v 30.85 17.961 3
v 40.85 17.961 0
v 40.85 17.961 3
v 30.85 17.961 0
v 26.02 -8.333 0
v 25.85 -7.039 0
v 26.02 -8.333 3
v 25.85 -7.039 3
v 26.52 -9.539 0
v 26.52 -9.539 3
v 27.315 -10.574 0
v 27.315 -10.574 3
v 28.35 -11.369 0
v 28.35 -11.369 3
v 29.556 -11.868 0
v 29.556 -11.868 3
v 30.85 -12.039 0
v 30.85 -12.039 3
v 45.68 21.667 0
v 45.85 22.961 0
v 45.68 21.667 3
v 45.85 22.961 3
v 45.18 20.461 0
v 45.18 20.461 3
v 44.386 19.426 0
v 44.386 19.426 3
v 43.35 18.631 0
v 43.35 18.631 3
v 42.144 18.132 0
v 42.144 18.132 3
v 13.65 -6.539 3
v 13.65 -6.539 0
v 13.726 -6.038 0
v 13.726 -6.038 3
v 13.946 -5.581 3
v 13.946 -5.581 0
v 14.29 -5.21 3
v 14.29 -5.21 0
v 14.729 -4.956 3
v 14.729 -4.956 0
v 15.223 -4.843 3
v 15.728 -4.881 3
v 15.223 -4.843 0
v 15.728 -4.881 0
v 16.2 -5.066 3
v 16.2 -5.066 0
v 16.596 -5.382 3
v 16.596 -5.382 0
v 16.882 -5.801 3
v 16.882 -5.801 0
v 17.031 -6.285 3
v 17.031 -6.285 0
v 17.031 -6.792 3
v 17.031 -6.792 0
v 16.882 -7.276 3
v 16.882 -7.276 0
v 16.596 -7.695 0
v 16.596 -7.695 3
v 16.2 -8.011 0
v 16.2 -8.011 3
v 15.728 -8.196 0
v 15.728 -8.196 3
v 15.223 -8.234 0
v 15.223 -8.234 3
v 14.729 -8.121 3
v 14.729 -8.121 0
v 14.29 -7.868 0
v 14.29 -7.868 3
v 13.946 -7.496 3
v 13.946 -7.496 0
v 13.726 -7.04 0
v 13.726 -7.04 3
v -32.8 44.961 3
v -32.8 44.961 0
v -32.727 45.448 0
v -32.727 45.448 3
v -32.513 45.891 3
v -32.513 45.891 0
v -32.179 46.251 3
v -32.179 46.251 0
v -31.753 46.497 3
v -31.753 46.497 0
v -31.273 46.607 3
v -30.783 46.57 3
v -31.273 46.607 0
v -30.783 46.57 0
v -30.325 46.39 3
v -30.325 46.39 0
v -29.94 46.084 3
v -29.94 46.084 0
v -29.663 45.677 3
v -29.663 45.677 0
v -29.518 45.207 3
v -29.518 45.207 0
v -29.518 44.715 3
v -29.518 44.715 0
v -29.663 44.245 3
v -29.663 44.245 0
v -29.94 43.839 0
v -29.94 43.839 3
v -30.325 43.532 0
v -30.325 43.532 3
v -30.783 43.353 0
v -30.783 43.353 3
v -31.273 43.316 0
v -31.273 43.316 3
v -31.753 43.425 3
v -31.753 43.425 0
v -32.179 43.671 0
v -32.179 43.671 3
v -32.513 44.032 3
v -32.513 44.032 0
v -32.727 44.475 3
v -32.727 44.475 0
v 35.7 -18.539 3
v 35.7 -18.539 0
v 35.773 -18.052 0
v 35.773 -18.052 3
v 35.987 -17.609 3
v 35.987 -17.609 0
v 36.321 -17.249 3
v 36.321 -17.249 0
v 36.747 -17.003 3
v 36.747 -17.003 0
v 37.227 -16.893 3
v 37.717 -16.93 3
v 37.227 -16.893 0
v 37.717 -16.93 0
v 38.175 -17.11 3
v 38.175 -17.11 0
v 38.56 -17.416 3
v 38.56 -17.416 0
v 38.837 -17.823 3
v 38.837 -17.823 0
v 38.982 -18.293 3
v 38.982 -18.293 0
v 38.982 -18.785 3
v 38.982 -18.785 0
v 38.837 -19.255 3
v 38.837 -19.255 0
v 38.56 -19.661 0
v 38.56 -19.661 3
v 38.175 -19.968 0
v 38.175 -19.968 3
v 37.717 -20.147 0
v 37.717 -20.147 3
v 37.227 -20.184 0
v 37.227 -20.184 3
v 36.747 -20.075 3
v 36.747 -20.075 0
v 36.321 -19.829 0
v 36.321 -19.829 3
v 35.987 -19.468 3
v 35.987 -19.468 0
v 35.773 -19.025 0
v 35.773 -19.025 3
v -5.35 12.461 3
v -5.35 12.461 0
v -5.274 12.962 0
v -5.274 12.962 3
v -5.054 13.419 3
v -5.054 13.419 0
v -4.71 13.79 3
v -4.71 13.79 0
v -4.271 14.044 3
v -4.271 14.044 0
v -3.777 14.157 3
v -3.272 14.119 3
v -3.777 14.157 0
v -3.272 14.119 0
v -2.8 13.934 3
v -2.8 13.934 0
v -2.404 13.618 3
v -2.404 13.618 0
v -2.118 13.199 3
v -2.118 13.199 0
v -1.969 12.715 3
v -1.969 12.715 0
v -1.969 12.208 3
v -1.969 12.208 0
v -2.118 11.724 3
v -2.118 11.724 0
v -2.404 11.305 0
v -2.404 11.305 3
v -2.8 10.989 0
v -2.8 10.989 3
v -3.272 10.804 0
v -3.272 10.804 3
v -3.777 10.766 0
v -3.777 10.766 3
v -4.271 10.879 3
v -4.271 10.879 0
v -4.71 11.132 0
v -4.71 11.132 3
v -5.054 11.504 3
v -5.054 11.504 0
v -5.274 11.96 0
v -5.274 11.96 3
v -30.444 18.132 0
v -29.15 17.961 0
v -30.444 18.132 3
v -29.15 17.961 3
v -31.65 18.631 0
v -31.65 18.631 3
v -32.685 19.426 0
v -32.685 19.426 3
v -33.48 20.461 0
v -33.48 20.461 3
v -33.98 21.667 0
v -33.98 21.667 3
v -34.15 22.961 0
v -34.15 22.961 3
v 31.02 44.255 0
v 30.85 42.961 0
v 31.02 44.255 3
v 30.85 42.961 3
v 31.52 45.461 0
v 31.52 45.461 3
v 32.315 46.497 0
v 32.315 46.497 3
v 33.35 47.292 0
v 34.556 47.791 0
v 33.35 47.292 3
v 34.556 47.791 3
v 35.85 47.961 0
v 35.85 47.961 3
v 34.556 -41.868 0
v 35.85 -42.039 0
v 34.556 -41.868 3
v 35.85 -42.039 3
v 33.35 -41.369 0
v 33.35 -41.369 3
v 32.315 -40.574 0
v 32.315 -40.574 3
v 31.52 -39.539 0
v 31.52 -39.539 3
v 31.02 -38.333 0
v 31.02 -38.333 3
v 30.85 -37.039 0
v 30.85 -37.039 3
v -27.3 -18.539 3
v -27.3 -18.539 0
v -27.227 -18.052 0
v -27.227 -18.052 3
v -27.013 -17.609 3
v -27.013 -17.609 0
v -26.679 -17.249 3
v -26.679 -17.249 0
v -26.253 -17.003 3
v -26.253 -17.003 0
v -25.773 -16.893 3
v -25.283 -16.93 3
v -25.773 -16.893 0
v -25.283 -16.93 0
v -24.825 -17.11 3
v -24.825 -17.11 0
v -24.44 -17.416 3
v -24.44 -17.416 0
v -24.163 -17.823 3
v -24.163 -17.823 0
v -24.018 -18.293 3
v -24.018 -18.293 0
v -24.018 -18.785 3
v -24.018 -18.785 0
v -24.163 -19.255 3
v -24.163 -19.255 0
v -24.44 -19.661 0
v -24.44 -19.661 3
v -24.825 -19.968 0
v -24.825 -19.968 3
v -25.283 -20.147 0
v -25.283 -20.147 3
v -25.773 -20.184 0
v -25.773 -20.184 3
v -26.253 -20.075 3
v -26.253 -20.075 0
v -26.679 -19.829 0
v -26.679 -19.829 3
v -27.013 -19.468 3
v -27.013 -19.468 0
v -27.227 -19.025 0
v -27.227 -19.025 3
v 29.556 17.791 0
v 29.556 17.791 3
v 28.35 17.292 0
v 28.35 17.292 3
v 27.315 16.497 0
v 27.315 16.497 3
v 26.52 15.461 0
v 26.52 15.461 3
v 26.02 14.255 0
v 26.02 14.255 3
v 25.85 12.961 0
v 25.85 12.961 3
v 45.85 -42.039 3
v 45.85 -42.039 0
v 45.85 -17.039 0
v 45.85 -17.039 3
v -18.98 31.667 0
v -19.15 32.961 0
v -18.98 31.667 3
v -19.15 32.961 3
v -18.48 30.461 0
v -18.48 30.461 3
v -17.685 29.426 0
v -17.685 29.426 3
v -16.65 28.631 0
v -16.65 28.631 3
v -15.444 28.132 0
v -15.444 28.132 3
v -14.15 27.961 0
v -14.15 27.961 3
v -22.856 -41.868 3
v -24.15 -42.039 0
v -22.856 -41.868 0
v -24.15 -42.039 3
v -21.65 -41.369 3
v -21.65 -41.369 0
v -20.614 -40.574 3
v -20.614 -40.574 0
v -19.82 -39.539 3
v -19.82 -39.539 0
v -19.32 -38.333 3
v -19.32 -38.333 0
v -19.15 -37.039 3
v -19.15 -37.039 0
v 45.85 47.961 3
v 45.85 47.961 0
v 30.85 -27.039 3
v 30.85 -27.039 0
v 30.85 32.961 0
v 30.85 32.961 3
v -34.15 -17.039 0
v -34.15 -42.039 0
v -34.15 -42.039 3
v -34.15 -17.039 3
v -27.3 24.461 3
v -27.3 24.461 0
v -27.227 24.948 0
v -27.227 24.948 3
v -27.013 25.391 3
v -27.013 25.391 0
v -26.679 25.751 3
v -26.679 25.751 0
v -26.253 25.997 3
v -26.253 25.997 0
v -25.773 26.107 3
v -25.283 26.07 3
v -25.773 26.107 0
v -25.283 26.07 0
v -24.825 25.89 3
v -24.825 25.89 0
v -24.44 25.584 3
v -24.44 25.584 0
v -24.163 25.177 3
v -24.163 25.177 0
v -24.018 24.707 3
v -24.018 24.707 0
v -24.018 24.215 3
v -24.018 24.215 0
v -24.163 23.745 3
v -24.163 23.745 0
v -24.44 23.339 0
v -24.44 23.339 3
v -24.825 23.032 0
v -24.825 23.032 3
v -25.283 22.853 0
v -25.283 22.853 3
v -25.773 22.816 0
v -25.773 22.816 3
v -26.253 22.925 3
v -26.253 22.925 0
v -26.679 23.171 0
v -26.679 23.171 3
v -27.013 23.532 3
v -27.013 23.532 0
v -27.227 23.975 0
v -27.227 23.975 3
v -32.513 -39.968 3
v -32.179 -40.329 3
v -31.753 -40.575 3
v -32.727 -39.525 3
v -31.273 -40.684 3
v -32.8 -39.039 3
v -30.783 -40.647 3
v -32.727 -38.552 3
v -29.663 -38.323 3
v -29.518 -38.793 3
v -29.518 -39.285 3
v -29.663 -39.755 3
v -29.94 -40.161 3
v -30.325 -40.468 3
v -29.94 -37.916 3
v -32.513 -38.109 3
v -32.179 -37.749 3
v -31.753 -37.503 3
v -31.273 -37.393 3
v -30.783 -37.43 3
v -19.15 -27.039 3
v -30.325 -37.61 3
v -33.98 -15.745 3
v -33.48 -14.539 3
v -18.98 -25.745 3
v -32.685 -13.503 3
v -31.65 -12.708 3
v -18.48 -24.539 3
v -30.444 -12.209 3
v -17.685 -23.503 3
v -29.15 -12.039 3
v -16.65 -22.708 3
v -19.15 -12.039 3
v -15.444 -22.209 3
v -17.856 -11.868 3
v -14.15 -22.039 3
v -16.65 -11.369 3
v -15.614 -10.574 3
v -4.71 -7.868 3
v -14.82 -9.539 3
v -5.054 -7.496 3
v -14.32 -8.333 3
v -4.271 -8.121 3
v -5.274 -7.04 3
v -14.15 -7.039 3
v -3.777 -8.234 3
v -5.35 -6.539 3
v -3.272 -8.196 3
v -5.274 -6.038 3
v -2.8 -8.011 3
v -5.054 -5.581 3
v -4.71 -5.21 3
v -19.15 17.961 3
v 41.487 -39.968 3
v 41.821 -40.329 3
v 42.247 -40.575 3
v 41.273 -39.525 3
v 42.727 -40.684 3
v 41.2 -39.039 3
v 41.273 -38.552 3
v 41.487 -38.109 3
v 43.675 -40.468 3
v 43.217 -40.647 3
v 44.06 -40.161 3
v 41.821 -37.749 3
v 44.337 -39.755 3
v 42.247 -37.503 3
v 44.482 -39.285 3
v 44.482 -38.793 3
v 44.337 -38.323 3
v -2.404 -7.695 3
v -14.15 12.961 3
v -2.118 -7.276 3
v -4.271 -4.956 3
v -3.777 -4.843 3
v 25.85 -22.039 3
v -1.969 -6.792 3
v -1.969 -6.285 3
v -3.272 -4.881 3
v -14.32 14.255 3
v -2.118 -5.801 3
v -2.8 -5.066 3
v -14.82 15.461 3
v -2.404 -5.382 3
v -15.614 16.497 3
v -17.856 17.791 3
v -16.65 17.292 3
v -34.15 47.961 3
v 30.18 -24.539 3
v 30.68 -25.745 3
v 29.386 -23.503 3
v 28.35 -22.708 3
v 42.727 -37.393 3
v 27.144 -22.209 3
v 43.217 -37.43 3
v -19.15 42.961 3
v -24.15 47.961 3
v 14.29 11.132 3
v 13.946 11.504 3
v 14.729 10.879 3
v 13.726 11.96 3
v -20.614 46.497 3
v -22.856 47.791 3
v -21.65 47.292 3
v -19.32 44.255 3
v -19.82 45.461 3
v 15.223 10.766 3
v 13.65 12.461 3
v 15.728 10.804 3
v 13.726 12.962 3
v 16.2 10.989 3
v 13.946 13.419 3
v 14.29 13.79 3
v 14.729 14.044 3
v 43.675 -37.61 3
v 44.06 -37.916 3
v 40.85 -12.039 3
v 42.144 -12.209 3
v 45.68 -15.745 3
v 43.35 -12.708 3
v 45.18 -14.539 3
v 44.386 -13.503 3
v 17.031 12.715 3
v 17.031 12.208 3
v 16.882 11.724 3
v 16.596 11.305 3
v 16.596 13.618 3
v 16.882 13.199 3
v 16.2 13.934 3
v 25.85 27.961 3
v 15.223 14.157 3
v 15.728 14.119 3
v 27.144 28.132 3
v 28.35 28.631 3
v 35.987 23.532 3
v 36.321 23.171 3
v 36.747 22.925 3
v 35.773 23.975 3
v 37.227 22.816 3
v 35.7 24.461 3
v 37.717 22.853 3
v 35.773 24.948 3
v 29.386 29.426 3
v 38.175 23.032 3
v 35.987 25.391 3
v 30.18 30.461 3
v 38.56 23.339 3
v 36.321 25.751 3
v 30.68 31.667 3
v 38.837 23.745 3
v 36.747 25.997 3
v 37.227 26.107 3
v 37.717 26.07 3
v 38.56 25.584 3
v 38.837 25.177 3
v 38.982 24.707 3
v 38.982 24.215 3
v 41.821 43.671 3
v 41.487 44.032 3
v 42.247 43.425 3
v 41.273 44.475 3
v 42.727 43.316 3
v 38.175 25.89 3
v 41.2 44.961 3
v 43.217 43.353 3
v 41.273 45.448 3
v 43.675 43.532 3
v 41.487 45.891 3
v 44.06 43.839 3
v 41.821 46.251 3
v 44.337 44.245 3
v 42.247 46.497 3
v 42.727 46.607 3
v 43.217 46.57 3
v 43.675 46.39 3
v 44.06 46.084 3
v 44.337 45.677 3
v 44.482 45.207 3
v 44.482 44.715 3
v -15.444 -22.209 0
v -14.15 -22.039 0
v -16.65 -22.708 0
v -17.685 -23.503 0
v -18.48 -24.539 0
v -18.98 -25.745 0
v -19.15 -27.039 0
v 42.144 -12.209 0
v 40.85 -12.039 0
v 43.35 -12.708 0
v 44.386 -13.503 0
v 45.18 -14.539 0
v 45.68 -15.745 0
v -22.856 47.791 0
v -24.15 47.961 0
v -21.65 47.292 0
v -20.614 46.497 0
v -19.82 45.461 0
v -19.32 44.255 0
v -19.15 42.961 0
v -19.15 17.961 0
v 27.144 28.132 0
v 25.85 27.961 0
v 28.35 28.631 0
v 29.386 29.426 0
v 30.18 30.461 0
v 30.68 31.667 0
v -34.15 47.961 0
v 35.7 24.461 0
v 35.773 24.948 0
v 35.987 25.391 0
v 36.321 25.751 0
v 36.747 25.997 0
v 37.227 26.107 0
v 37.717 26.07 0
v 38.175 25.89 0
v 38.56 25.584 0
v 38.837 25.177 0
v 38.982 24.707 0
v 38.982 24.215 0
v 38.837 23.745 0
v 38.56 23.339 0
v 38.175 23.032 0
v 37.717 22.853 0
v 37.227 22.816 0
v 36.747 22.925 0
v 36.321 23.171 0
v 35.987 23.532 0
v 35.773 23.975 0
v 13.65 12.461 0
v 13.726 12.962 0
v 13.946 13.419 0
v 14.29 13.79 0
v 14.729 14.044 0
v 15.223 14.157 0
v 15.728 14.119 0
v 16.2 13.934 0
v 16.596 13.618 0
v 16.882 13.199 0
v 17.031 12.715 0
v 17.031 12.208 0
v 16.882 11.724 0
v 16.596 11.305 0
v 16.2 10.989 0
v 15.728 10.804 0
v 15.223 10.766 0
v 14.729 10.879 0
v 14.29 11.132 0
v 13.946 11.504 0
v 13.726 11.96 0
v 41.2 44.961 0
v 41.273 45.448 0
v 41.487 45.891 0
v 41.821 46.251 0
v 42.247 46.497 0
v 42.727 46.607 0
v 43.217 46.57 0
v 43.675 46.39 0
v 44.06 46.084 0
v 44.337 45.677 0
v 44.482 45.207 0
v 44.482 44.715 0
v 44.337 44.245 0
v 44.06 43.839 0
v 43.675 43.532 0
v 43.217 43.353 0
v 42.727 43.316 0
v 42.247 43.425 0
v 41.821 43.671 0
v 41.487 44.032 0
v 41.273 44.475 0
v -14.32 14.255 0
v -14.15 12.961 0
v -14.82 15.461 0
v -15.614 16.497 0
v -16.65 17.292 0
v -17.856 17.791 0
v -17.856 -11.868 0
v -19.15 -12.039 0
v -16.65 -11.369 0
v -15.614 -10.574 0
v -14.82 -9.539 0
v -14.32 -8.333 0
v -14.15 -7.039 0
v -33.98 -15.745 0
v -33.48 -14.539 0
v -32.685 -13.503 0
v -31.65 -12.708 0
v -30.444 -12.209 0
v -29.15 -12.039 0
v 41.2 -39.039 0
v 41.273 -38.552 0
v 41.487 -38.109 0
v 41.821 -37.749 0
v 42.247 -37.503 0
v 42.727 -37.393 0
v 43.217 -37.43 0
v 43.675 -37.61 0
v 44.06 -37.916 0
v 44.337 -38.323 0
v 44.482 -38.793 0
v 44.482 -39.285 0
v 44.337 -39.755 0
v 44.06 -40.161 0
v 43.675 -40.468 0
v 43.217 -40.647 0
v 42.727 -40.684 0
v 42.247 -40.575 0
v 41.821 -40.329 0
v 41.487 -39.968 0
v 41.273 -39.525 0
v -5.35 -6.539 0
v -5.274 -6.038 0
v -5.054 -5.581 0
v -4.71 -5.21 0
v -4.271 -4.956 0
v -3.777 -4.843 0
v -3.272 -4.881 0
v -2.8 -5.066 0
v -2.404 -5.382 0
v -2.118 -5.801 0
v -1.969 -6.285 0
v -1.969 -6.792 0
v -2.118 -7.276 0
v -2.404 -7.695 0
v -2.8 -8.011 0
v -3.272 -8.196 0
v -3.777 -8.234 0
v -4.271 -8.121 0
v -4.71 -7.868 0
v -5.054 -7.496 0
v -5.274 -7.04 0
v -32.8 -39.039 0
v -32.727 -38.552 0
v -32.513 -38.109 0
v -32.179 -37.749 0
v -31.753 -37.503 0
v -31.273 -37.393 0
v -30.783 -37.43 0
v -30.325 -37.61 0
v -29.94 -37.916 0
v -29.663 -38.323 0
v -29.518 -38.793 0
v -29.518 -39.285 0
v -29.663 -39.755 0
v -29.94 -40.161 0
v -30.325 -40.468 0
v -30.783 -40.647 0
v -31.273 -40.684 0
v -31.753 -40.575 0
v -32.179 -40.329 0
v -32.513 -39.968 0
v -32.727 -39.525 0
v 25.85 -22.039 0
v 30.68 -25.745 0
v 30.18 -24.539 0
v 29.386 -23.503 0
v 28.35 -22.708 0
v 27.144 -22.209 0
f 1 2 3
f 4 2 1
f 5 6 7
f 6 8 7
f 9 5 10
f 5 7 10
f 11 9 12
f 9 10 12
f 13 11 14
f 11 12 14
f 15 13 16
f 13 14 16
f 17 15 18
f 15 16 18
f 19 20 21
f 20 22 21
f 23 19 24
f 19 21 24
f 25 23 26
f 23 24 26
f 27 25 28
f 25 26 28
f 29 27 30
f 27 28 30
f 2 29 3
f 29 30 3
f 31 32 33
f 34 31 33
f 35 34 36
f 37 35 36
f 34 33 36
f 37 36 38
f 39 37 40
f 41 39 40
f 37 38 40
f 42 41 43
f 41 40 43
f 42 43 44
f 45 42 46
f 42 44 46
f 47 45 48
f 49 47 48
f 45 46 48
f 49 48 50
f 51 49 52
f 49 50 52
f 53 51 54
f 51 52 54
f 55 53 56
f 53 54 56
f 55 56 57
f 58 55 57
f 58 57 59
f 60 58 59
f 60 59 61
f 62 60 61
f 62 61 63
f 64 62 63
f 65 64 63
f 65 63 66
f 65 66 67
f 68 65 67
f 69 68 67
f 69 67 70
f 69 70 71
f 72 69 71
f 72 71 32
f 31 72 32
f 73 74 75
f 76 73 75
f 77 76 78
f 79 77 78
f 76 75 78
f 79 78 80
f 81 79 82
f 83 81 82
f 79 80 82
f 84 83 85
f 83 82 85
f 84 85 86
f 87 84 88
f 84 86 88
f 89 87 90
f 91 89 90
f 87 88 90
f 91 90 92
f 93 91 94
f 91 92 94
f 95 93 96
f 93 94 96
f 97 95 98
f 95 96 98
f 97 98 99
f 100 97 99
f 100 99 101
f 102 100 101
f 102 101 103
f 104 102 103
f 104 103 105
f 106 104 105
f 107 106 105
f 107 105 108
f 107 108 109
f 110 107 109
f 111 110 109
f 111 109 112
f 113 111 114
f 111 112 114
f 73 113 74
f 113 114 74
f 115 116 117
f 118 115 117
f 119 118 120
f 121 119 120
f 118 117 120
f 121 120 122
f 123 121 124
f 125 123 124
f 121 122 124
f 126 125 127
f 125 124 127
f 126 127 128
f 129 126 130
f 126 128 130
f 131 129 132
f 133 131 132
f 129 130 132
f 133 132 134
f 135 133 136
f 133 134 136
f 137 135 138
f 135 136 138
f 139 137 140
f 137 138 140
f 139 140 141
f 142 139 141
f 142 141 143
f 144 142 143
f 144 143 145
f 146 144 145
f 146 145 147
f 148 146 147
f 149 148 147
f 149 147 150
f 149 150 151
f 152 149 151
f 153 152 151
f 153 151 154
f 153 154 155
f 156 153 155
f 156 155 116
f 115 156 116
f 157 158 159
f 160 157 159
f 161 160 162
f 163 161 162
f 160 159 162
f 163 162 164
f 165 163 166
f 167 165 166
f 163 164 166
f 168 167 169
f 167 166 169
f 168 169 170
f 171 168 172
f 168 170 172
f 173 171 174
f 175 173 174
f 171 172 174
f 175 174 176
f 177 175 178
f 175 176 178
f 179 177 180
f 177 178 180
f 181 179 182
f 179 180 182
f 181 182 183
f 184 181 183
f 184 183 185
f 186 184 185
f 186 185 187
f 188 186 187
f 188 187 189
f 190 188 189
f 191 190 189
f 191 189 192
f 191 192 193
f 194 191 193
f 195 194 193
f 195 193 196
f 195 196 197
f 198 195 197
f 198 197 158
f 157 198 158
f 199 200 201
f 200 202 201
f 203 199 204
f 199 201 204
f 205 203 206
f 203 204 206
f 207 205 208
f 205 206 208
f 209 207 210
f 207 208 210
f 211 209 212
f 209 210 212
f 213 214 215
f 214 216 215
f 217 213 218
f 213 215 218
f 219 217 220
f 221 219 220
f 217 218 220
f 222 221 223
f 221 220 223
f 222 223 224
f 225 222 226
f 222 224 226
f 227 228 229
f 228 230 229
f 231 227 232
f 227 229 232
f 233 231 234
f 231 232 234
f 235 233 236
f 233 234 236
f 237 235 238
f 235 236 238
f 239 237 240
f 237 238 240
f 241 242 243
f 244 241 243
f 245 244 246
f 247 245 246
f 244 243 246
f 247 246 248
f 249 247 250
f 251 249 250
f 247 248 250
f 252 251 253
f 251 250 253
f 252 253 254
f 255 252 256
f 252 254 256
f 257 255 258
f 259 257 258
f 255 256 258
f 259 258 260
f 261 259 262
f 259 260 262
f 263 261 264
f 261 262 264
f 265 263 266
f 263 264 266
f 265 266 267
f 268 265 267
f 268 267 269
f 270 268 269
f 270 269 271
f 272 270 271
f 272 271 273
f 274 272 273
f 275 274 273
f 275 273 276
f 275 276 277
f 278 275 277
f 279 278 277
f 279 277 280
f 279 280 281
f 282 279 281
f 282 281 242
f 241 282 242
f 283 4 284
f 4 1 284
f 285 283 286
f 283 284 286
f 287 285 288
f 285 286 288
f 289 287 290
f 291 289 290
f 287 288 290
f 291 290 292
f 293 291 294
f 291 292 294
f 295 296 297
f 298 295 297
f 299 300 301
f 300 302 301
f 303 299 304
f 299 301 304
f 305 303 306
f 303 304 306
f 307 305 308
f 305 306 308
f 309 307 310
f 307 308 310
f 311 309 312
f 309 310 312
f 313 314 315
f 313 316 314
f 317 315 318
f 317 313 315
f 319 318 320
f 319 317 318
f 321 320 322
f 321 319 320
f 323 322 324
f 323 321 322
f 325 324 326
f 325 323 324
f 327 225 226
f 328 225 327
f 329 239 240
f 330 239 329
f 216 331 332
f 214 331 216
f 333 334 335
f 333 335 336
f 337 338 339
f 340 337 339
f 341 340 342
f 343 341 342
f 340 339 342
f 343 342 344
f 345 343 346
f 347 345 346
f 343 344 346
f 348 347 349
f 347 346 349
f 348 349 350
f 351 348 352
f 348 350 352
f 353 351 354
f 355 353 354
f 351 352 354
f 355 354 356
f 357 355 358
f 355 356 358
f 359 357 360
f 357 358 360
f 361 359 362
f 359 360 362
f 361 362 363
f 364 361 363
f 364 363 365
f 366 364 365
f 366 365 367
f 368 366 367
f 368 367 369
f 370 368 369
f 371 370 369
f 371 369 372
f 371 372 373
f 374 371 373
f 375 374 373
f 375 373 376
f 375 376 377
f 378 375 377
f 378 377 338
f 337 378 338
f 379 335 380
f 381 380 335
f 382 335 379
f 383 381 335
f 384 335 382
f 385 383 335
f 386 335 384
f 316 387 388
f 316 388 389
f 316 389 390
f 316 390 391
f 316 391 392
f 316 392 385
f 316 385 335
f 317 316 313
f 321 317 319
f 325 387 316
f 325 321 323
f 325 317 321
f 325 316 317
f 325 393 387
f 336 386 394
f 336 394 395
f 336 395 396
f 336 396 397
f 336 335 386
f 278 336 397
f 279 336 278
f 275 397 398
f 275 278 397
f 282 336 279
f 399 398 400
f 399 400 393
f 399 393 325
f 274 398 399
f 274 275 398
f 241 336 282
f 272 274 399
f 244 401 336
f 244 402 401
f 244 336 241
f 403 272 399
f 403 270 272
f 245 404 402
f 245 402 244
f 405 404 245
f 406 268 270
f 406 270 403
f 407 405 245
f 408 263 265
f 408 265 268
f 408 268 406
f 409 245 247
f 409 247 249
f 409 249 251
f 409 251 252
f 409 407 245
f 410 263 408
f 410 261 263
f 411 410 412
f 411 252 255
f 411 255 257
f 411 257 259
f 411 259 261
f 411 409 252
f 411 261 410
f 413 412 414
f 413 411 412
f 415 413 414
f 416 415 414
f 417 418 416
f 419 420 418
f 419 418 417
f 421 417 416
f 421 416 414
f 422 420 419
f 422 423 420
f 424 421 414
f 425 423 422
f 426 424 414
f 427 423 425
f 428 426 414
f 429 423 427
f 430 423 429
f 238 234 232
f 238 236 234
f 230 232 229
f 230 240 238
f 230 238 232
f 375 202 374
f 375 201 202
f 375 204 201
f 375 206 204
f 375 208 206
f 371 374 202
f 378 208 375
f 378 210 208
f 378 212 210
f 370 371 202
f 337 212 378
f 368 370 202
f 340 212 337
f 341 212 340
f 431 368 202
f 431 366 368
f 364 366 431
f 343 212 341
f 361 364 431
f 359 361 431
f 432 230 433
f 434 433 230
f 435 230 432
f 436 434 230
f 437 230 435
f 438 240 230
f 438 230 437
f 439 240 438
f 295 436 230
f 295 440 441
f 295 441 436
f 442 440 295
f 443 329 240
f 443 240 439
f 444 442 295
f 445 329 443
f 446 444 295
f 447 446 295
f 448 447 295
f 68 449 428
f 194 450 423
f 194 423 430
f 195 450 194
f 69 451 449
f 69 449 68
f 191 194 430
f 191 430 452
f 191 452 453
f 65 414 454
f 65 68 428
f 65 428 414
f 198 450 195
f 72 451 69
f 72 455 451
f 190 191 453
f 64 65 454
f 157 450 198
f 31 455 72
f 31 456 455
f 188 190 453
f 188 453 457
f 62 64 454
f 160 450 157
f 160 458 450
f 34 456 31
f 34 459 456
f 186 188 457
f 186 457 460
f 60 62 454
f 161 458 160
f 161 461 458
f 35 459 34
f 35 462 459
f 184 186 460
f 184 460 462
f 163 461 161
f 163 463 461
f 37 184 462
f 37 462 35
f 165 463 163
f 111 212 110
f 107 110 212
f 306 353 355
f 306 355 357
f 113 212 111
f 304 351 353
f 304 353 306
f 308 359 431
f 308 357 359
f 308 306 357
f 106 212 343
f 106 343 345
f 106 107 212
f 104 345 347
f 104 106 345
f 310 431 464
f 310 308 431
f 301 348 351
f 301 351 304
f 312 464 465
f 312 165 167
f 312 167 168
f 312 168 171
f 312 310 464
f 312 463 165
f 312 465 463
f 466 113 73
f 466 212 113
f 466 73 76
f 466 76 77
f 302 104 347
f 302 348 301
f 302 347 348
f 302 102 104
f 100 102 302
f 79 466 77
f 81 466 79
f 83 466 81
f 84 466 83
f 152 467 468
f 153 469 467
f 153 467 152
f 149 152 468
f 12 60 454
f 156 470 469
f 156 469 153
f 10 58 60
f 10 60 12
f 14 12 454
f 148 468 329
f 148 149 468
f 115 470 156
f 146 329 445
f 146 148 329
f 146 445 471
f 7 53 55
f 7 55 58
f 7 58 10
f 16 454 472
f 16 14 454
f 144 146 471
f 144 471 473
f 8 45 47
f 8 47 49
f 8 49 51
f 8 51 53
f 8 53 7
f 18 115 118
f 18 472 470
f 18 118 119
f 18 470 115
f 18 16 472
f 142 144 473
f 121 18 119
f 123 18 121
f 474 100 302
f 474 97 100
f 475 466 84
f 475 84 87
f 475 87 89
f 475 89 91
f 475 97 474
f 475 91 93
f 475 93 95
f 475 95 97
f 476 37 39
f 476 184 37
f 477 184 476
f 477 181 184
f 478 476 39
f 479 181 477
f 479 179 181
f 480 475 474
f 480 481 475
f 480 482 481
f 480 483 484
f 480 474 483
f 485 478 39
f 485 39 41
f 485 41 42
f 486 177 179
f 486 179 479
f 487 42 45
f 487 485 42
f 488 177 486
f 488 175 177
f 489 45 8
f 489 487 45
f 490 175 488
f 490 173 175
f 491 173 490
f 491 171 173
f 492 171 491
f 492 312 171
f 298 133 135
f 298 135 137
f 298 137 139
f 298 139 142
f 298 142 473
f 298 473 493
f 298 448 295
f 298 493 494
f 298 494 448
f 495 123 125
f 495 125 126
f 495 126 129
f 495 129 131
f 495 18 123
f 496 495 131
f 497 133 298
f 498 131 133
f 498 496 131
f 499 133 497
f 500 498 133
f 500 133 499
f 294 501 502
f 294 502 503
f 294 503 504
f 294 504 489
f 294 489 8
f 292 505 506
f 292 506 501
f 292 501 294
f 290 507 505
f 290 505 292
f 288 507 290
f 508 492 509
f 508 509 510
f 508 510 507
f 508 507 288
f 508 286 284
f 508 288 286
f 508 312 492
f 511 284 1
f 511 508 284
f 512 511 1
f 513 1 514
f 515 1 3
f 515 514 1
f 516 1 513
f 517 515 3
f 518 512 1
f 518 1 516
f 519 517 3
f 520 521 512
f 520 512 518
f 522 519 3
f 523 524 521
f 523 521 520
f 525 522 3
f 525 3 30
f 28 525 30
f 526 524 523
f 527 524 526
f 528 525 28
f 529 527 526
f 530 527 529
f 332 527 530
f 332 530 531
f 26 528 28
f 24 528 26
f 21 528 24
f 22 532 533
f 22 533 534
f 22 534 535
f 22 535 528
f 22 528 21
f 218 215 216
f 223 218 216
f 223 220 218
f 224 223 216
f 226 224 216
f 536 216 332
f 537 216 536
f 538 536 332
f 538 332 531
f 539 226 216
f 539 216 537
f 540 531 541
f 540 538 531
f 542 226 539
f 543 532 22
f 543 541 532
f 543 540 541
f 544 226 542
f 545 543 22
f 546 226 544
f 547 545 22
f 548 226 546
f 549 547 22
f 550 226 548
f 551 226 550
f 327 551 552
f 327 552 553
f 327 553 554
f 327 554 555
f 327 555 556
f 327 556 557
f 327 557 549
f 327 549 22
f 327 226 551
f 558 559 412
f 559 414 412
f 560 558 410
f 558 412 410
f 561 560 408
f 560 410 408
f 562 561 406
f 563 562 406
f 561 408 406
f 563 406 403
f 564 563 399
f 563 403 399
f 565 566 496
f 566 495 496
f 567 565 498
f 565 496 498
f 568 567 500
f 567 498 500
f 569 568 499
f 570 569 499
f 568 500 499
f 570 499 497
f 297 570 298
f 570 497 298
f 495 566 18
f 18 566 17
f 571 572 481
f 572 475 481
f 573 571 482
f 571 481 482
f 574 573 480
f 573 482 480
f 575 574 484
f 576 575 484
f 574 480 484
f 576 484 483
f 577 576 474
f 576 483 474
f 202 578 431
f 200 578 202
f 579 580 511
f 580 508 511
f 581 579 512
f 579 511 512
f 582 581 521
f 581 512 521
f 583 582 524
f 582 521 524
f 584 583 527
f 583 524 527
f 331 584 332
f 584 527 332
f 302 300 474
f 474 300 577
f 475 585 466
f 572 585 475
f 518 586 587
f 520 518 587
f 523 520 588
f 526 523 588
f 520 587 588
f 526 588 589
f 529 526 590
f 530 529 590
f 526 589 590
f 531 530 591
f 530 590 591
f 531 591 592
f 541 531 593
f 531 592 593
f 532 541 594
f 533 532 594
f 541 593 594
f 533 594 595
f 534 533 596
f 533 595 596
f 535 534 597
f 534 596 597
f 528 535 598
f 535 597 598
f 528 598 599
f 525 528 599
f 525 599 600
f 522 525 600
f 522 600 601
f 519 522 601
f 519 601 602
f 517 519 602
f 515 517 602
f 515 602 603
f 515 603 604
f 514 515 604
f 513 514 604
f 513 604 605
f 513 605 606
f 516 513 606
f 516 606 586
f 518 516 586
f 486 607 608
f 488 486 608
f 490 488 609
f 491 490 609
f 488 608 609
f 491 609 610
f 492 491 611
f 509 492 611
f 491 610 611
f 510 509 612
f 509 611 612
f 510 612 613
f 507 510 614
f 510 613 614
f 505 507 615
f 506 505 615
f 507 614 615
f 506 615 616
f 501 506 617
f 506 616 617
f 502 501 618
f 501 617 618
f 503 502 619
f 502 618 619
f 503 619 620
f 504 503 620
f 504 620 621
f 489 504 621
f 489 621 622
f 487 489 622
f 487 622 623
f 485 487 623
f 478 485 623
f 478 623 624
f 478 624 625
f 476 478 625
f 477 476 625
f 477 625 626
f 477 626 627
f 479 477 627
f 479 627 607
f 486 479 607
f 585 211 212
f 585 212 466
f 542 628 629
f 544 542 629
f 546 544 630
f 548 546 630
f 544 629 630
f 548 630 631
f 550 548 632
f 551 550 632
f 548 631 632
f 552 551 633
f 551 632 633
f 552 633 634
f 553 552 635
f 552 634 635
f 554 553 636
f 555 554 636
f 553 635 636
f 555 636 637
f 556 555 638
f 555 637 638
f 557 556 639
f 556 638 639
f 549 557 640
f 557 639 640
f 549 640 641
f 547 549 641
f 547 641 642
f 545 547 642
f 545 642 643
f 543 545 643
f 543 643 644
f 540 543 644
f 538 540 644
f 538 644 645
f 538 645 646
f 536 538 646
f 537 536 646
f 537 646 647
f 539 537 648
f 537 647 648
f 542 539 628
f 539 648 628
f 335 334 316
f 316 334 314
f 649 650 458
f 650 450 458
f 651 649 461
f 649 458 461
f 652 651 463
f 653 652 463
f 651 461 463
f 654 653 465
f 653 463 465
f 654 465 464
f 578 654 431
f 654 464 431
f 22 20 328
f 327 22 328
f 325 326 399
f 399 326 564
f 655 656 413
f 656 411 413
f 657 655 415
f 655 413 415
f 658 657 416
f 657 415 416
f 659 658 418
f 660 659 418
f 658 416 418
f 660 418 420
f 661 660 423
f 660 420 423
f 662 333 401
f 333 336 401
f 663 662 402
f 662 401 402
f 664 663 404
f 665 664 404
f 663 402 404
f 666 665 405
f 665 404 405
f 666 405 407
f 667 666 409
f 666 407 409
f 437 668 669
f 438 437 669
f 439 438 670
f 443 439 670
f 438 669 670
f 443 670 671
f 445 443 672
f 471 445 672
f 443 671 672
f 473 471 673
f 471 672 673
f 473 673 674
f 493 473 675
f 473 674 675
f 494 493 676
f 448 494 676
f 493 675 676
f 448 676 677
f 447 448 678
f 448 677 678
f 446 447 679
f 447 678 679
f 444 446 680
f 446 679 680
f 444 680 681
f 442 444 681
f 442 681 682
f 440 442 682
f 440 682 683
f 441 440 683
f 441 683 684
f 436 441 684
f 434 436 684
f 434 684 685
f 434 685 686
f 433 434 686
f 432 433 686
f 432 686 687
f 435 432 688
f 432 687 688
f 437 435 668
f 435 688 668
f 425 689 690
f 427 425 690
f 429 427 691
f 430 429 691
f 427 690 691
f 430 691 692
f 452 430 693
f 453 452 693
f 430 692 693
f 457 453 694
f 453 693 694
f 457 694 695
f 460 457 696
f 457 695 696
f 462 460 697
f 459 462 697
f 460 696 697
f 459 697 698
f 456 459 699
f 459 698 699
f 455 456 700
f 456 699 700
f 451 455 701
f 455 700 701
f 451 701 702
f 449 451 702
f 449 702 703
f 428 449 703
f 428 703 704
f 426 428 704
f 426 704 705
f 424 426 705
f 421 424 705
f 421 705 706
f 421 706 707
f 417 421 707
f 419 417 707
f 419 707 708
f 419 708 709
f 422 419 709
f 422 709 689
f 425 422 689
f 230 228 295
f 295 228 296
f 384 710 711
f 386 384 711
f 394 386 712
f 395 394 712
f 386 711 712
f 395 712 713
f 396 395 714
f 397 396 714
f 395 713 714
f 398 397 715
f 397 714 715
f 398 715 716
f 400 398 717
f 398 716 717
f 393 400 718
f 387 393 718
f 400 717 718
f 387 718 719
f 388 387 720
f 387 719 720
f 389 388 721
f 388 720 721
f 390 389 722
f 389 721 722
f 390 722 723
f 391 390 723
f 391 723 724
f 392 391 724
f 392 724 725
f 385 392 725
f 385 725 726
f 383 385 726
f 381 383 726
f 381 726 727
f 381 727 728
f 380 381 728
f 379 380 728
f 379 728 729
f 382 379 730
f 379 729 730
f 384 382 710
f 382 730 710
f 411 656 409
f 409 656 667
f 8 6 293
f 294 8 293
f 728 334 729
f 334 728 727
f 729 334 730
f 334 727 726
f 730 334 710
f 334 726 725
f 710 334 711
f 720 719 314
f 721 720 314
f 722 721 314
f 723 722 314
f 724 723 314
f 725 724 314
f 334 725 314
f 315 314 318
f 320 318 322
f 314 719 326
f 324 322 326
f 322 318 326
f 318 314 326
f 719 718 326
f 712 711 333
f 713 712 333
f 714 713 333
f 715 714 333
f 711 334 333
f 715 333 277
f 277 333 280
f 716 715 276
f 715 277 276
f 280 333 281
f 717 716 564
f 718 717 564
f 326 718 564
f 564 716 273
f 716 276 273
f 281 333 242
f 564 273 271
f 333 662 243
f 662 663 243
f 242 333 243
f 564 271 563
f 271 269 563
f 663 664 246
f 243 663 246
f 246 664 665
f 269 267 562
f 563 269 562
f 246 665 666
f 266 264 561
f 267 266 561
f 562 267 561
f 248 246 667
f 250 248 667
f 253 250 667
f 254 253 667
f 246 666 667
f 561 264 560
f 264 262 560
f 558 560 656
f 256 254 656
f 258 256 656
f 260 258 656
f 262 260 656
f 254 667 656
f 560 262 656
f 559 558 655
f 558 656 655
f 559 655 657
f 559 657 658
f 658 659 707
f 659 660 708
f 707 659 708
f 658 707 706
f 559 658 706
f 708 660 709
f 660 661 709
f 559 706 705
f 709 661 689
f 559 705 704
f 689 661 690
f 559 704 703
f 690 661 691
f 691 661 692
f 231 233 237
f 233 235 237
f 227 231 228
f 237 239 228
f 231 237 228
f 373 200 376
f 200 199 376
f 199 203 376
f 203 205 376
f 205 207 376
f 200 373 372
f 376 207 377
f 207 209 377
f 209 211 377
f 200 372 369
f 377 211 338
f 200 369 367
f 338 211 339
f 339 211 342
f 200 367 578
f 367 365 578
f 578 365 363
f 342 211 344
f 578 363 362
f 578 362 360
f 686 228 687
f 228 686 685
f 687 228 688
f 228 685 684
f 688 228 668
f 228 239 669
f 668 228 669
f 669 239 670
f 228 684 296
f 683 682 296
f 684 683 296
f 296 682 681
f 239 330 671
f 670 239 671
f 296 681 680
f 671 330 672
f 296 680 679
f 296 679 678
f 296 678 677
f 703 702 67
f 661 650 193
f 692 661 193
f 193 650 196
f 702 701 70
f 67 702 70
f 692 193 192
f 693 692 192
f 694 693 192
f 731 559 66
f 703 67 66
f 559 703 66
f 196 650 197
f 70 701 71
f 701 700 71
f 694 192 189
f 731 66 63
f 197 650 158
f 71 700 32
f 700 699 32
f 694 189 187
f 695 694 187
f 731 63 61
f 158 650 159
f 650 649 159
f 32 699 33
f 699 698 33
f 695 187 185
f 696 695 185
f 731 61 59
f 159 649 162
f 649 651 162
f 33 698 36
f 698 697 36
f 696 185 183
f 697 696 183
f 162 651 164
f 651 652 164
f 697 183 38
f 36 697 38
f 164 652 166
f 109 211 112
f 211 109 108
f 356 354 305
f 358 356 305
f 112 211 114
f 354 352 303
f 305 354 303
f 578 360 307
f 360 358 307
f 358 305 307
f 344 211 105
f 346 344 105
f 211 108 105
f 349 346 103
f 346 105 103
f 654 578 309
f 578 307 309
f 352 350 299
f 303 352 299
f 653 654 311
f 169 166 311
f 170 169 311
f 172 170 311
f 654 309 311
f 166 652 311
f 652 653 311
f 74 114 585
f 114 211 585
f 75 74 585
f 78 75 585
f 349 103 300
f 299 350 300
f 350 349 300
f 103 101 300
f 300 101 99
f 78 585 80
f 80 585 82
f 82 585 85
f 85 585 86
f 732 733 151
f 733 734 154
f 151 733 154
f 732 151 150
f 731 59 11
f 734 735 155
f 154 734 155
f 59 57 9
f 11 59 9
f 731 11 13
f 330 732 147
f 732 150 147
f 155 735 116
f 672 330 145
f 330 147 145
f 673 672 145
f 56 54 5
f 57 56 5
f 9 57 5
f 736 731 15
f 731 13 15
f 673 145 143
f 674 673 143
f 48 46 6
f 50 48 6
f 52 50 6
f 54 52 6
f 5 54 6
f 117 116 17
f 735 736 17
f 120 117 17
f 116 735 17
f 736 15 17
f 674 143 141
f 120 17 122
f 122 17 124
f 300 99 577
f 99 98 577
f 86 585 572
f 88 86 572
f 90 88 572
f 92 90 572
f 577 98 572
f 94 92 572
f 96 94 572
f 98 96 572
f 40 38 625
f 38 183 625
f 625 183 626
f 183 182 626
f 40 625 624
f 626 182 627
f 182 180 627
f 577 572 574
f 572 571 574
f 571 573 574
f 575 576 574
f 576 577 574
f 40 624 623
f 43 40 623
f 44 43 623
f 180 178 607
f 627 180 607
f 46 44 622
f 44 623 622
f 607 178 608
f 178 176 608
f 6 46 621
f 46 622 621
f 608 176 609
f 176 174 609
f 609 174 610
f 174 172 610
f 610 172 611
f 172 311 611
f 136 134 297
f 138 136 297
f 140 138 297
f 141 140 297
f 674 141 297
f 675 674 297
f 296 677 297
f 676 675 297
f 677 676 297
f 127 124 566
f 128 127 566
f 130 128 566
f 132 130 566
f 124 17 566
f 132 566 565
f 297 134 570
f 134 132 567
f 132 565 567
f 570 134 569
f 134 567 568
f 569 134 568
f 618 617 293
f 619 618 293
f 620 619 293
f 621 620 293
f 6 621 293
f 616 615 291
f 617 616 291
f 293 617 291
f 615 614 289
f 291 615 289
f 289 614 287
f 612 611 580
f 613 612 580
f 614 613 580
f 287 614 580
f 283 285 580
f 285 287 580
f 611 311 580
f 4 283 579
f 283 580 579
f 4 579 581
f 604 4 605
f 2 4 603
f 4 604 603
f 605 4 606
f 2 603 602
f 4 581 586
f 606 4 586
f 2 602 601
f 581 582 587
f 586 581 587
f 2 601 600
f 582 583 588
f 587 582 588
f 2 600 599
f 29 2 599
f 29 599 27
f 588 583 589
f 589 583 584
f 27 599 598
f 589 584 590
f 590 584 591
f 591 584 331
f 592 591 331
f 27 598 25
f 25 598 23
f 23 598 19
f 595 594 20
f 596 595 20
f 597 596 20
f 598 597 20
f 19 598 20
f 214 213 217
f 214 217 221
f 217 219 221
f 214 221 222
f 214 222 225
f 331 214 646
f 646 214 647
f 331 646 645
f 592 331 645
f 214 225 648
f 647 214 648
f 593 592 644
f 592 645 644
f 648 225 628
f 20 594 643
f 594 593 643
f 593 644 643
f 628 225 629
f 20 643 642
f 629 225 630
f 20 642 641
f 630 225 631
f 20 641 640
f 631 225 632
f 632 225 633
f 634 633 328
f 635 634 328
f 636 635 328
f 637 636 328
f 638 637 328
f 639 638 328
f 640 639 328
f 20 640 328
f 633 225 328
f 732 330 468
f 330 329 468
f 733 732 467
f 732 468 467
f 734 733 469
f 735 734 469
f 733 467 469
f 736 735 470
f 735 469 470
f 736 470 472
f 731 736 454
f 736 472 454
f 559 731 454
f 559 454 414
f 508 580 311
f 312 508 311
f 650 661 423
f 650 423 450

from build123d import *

# Parameters (mm, degrees)
SKETCH_1_W          = 80
SKETCH_1_H          = 90
EXTRUDE_1_DEPTH     = 3
SKETCH_2_R          = 1.65
CUT_EXTRUDE_1_DEPTH = 3
CUT_EXTRUDE_2_REACH = 5
SKETCH_3_R          = 1.65
SKETCH_3_W          = 50
SKETCH_3_H          = 20
SKETCH_3_W_2        = 20
SKETCH_3_H_2        = 30
FILLET_1_R          = 5
CUT_EXTRUDE_3_REACH = 5
SKETCH_4_R          = 1.7


with BuildPart() as part:
    # 草图1 → 凸台-拉伸1 (new body)
    with BuildSketch(Plane.XY):
        with Locations((5.850106622, 2.961375961)):
            Rectangle(SKETCH_1_W, SKETCH_1_H)
    extrude(amount=EXTRUDE_1_DEPTH)

    # 草图2 → 切除-拉伸1 (cut)
    with BuildSketch(Plane(origin=(0, 0, 0), x_dir=(-1, 0, 0), z_dir=(0, 0, -1))):
        with Locations((31.149893378, -39.038624039)):
            Circle(SKETCH_2_R)
        with Locations((-42.850106622, -39.038624039)):
            Circle(SKETCH_2_R)
        with Locations((31.149893378, 44.961375961)):
            Circle(SKETCH_2_R)
        with Locations((-42.850106622, 44.961375961)):
            Circle(SKETCH_2_R)
    extrude(amount=-CUT_EXTRUDE_1_DEPTH, mode=Mode.SUBTRACT)

    # 草图3 → 切除-拉伸2 (cut, up to next)
    with BuildSketch(Plane(origin=(0, 0, 0), x_dir=(-1, 0, 0), z_dir=(0, 0, -1)), mode=Mode.PRIVATE) as cut_extrude_2_sk1:
        with Locations((-37.350106622, 24.461375961)):
            Circle(SKETCH_3_R)
    cut_extrude_2_tool1 = extrude(cut_extrude_2_sk1.sketch, amount=-CUT_EXTRUDE_2_REACH, mode=Mode.PRIVATE) & part.part
    add(cut_extrude_2_tool1.solids().sort_by_distance((37.350107, 24.461376, 0))[0], mode=Mode.SUBTRACT)
    # 草图3 → 切除-拉伸2 (cut, up to next)
    with BuildSketch(Plane(origin=(0, 0, 0), x_dir=(-1, 0, 0), z_dir=(0, 0, -1)), mode=Mode.PRIVATE) as cut_extrude_2_sk2:
        with Locations((25.649893378, 24.461375961)):
            Circle(SKETCH_3_R)
    cut_extrude_2_tool2 = extrude(cut_extrude_2_sk2.sketch, amount=-CUT_EXTRUDE_2_REACH, mode=Mode.PRIVATE) & part.part
    add(cut_extrude_2_tool2.solids().sort_by_distance((-25.649893, 24.461376, 0))[0], mode=Mode.SUBTRACT)
    # 草图3 → 切除-拉伸2 (cut, up to next)
    with BuildSketch(Plane(origin=(0, 0, 0), x_dir=(-1, 0, 0), z_dir=(0, 0, -1)), mode=Mode.PRIVATE) as cut_extrude_2_sk3:
        with Locations((25.649893378, -18.538624039)):
            Circle(SKETCH_3_R)
    cut_extrude_2_tool3 = extrude(cut_extrude_2_sk3.sketch, amount=-CUT_EXTRUDE_2_REACH, mode=Mode.PRIVATE) & part.part
    add(cut_extrude_2_tool3.solids().sort_by_distance((-25.649893, -18.538624, 0))[0], mode=Mode.SUBTRACT)
    # 草图3 → 切除-拉伸2 (cut, up to next)
    with BuildSketch(Plane(origin=(0, 0, 0), x_dir=(-1, 0, 0), z_dir=(0, 0, -1)), mode=Mode.PRIVATE) as cut_extrude_2_sk4:
        with Locations((-37.350106622, -18.538624039)):
            Circle(SKETCH_3_R)
    cut_extrude_2_tool4 = extrude(cut_extrude_2_sk4.sketch, amount=-CUT_EXTRUDE_2_REACH, mode=Mode.PRIVATE) & part.part
    add(cut_extrude_2_tool4.solids().sort_by_distance((37.350107, -18.538624, 0))[0], mode=Mode.SUBTRACT)
    # 草图3 → 切除-拉伸2 (cut, up to next)
    with BuildSketch(Plane(origin=(0, 0, 0), x_dir=(-1, 0, 0), z_dir=(0, 0, -1)), mode=Mode.PRIVATE) as cut_extrude_2_sk5:
        with Locations((-5.850106622, 37.961375961)):
            Rectangle(SKETCH_3_W, SKETCH_3_H)
    cut_extrude_2_tool5 = extrude(cut_extrude_2_sk5.sketch, amount=-CUT_EXTRUDE_2_REACH, mode=Mode.PRIVATE) & part.part
    add(cut_extrude_2_tool5.solids().sort_by_distance((5.850107, 37.961376, 0))[0], mode=Mode.SUBTRACT)
    # 草图3 → 切除-拉伸2 (cut, up to next)
    with BuildSketch(Plane(origin=(0, 0, 0), x_dir=(-1, 0, 0), z_dir=(0, 0, -1)), mode=Mode.PRIVATE) as cut_extrude_2_sk6:
        with Locations((-5.850106622, -32.038624039)):
            Rectangle(SKETCH_3_W, SKETCH_3_H)
    cut_extrude_2_tool6 = extrude(cut_extrude_2_sk6.sketch, amount=-CUT_EXTRUDE_2_REACH, mode=Mode.PRIVATE) & part.part
    add(cut_extrude_2_tool6.solids().sort_by_distance((5.850107, -32.038624, 0))[0], mode=Mode.SUBTRACT)
    # 草图3 → 切除-拉伸2 (cut, up to next)
    with BuildSketch(Plane(origin=(0, 0, 0), x_dir=(-1, 0, 0), z_dir=(0, 0, -1)), mode=Mode.PRIVATE) as cut_extrude_2_sk7:
        with Locations((24.149893378, 2.961375961)):
            Rectangle(SKETCH_3_W_2, SKETCH_3_H_2)
    cut_extrude_2_tool7 = extrude(cut_extrude_2_sk7.sketch, amount=-CUT_EXTRUDE_2_REACH, mode=Mode.PRIVATE) & part.part
    add(cut_extrude_2_tool7.solids().sort_by_distance((-24.149893, 2.961376, 0))[0], mode=Mode.SUBTRACT)
    # 草图3 → 切除-拉伸2 (cut, up to next)
    with BuildSketch(Plane(origin=(0, 0, 0), x_dir=(-1, 0, 0), z_dir=(0, 0, -1)), mode=Mode.PRIVATE) as cut_extrude_2_sk8:
        with Locations((-35.850106622, 2.961375961)):
            Rectangle(SKETCH_3_W_2, SKETCH_3_H_2)
    cut_extrude_2_tool8 = extrude(cut_extrude_2_sk8.sketch, amount=-CUT_EXTRUDE_2_REACH, mode=Mode.PRIVATE) & part.part
    add(cut_extrude_2_tool8.solids().sort_by_distance((35.850107, 2.961376, 0))[0], mode=Mode.SUBTRACT)

    # 圆角1
    fillet_1_edges = [part.edges().sort_by_distance(p)[0] for p in [
        (30.850106622, 47.961375961, 1.5),
        (-19.149893378, 47.961375961, 1.5),
        (-19.149893378, 27.961375961, 1.5),
        (30.850106622, 27.961375961, 1.5),
        (45.850106622, -12.038624039, 1.5),
        (45.850106622, 17.961375961, 1.5),
        (25.850106622, 17.961375961, 1.5),
        (25.850106622, -12.038624039, 1.5),
        (-14.149893378, 17.961375961, 1.5),
        (-34.149893378, 17.961375961, 1.5),
        (-34.149893378, -12.038624039, 1.5),
        (-14.149893378, -12.038624039, 1.5),
        (30.850106622, -22.038624039, 1.5),
        (-19.149893378, -22.038624039, 1.5),
        (-19.149893378, -42.038624039, 1.5),
        (30.850106622, -42.038624039, 1.5),
    ]]
    fillet(fillet_1_edges, radius=FILLET_1_R)

    # 草图4 → 切除-拉伸3 (cut, up to next)
    with BuildSketch(Plane(origin=(0, 0, 0), x_dir=(-1, 0, 0), z_dir=(0, 0, -1)), mode=Mode.PRIVATE) as cut_extrude_3_sk1:
        with Locations((3.649893378, 12.461375961)):
            Circle(SKETCH_4_R)
    cut_extrude_3_tool1 = extrude(cut_extrude_3_sk1.sketch, amount=-CUT_EXTRUDE_3_REACH, mode=Mode.PRIVATE) & part.part
    add(cut_extrude_3_tool1.solids().sort_by_distance((-3.649893, 12.461376, 0))[0], mode=Mode.SUBTRACT)
    # 草图4 → 切除-拉伸3 (cut, up to next)
    with BuildSketch(Plane(origin=(0, 0, 0), x_dir=(-1, 0, 0), z_dir=(0, 0, -1)), mode=Mode.PRIVATE) as cut_extrude_3_sk2:
        with Locations((3.649893378, -6.538624039)):
            Circle(SKETCH_4_R)
    cut_extrude_3_tool2 = extrude(cut_extrude_3_sk2.sketch, amount=-CUT_EXTRUDE_3_REACH, mode=Mode.PRIVATE) & part.part
    add(cut_extrude_3_tool2.solids().sort_by_distance((-3.649893, -6.538624, 0))[0], mode=Mode.SUBTRACT)
    # 草图4 → 切除-拉伸3 (cut, up to next)
    with BuildSketch(Plane(origin=(0, 0, 0), x_dir=(-1, 0, 0), z_dir=(0, 0, -1)), mode=Mode.PRIVATE) as cut_extrude_3_sk3:
        with Locations((-15.350106622, -6.538624039)):
            Circle(SKETCH_4_R)
    cut_extrude_3_tool3 = extrude(cut_extrude_3_sk3.sketch, amount=-CUT_EXTRUDE_3_REACH, mode=Mode.PRIVATE) & part.part
    add(cut_extrude_3_tool3.solids().sort_by_distance((15.350107, -6.538624, 0))[0], mode=Mode.SUBTRACT)
    # 草图4 → 切除-拉伸3 (cut, up to next)
    with BuildSketch(Plane(origin=(0, 0, 0), x_dir=(-1, 0, 0), z_dir=(0, 0, -1)), mode=Mode.PRIVATE) as cut_extrude_3_sk4:
        with Locations((-15.350106622, 12.461375961)):
            Circle(SKETCH_4_R)
    cut_extrude_3_tool4 = extrude(cut_extrude_3_sk4.sketch, amount=-CUT_EXTRUDE_3_REACH, mode=Mode.PRIVATE) & part.part
    add(cut_extrude_3_tool4.solids().sort_by_distance((15.350107, 12.461376, 0))[0], mode=Mode.SUBTRACT)


solid = part.part
